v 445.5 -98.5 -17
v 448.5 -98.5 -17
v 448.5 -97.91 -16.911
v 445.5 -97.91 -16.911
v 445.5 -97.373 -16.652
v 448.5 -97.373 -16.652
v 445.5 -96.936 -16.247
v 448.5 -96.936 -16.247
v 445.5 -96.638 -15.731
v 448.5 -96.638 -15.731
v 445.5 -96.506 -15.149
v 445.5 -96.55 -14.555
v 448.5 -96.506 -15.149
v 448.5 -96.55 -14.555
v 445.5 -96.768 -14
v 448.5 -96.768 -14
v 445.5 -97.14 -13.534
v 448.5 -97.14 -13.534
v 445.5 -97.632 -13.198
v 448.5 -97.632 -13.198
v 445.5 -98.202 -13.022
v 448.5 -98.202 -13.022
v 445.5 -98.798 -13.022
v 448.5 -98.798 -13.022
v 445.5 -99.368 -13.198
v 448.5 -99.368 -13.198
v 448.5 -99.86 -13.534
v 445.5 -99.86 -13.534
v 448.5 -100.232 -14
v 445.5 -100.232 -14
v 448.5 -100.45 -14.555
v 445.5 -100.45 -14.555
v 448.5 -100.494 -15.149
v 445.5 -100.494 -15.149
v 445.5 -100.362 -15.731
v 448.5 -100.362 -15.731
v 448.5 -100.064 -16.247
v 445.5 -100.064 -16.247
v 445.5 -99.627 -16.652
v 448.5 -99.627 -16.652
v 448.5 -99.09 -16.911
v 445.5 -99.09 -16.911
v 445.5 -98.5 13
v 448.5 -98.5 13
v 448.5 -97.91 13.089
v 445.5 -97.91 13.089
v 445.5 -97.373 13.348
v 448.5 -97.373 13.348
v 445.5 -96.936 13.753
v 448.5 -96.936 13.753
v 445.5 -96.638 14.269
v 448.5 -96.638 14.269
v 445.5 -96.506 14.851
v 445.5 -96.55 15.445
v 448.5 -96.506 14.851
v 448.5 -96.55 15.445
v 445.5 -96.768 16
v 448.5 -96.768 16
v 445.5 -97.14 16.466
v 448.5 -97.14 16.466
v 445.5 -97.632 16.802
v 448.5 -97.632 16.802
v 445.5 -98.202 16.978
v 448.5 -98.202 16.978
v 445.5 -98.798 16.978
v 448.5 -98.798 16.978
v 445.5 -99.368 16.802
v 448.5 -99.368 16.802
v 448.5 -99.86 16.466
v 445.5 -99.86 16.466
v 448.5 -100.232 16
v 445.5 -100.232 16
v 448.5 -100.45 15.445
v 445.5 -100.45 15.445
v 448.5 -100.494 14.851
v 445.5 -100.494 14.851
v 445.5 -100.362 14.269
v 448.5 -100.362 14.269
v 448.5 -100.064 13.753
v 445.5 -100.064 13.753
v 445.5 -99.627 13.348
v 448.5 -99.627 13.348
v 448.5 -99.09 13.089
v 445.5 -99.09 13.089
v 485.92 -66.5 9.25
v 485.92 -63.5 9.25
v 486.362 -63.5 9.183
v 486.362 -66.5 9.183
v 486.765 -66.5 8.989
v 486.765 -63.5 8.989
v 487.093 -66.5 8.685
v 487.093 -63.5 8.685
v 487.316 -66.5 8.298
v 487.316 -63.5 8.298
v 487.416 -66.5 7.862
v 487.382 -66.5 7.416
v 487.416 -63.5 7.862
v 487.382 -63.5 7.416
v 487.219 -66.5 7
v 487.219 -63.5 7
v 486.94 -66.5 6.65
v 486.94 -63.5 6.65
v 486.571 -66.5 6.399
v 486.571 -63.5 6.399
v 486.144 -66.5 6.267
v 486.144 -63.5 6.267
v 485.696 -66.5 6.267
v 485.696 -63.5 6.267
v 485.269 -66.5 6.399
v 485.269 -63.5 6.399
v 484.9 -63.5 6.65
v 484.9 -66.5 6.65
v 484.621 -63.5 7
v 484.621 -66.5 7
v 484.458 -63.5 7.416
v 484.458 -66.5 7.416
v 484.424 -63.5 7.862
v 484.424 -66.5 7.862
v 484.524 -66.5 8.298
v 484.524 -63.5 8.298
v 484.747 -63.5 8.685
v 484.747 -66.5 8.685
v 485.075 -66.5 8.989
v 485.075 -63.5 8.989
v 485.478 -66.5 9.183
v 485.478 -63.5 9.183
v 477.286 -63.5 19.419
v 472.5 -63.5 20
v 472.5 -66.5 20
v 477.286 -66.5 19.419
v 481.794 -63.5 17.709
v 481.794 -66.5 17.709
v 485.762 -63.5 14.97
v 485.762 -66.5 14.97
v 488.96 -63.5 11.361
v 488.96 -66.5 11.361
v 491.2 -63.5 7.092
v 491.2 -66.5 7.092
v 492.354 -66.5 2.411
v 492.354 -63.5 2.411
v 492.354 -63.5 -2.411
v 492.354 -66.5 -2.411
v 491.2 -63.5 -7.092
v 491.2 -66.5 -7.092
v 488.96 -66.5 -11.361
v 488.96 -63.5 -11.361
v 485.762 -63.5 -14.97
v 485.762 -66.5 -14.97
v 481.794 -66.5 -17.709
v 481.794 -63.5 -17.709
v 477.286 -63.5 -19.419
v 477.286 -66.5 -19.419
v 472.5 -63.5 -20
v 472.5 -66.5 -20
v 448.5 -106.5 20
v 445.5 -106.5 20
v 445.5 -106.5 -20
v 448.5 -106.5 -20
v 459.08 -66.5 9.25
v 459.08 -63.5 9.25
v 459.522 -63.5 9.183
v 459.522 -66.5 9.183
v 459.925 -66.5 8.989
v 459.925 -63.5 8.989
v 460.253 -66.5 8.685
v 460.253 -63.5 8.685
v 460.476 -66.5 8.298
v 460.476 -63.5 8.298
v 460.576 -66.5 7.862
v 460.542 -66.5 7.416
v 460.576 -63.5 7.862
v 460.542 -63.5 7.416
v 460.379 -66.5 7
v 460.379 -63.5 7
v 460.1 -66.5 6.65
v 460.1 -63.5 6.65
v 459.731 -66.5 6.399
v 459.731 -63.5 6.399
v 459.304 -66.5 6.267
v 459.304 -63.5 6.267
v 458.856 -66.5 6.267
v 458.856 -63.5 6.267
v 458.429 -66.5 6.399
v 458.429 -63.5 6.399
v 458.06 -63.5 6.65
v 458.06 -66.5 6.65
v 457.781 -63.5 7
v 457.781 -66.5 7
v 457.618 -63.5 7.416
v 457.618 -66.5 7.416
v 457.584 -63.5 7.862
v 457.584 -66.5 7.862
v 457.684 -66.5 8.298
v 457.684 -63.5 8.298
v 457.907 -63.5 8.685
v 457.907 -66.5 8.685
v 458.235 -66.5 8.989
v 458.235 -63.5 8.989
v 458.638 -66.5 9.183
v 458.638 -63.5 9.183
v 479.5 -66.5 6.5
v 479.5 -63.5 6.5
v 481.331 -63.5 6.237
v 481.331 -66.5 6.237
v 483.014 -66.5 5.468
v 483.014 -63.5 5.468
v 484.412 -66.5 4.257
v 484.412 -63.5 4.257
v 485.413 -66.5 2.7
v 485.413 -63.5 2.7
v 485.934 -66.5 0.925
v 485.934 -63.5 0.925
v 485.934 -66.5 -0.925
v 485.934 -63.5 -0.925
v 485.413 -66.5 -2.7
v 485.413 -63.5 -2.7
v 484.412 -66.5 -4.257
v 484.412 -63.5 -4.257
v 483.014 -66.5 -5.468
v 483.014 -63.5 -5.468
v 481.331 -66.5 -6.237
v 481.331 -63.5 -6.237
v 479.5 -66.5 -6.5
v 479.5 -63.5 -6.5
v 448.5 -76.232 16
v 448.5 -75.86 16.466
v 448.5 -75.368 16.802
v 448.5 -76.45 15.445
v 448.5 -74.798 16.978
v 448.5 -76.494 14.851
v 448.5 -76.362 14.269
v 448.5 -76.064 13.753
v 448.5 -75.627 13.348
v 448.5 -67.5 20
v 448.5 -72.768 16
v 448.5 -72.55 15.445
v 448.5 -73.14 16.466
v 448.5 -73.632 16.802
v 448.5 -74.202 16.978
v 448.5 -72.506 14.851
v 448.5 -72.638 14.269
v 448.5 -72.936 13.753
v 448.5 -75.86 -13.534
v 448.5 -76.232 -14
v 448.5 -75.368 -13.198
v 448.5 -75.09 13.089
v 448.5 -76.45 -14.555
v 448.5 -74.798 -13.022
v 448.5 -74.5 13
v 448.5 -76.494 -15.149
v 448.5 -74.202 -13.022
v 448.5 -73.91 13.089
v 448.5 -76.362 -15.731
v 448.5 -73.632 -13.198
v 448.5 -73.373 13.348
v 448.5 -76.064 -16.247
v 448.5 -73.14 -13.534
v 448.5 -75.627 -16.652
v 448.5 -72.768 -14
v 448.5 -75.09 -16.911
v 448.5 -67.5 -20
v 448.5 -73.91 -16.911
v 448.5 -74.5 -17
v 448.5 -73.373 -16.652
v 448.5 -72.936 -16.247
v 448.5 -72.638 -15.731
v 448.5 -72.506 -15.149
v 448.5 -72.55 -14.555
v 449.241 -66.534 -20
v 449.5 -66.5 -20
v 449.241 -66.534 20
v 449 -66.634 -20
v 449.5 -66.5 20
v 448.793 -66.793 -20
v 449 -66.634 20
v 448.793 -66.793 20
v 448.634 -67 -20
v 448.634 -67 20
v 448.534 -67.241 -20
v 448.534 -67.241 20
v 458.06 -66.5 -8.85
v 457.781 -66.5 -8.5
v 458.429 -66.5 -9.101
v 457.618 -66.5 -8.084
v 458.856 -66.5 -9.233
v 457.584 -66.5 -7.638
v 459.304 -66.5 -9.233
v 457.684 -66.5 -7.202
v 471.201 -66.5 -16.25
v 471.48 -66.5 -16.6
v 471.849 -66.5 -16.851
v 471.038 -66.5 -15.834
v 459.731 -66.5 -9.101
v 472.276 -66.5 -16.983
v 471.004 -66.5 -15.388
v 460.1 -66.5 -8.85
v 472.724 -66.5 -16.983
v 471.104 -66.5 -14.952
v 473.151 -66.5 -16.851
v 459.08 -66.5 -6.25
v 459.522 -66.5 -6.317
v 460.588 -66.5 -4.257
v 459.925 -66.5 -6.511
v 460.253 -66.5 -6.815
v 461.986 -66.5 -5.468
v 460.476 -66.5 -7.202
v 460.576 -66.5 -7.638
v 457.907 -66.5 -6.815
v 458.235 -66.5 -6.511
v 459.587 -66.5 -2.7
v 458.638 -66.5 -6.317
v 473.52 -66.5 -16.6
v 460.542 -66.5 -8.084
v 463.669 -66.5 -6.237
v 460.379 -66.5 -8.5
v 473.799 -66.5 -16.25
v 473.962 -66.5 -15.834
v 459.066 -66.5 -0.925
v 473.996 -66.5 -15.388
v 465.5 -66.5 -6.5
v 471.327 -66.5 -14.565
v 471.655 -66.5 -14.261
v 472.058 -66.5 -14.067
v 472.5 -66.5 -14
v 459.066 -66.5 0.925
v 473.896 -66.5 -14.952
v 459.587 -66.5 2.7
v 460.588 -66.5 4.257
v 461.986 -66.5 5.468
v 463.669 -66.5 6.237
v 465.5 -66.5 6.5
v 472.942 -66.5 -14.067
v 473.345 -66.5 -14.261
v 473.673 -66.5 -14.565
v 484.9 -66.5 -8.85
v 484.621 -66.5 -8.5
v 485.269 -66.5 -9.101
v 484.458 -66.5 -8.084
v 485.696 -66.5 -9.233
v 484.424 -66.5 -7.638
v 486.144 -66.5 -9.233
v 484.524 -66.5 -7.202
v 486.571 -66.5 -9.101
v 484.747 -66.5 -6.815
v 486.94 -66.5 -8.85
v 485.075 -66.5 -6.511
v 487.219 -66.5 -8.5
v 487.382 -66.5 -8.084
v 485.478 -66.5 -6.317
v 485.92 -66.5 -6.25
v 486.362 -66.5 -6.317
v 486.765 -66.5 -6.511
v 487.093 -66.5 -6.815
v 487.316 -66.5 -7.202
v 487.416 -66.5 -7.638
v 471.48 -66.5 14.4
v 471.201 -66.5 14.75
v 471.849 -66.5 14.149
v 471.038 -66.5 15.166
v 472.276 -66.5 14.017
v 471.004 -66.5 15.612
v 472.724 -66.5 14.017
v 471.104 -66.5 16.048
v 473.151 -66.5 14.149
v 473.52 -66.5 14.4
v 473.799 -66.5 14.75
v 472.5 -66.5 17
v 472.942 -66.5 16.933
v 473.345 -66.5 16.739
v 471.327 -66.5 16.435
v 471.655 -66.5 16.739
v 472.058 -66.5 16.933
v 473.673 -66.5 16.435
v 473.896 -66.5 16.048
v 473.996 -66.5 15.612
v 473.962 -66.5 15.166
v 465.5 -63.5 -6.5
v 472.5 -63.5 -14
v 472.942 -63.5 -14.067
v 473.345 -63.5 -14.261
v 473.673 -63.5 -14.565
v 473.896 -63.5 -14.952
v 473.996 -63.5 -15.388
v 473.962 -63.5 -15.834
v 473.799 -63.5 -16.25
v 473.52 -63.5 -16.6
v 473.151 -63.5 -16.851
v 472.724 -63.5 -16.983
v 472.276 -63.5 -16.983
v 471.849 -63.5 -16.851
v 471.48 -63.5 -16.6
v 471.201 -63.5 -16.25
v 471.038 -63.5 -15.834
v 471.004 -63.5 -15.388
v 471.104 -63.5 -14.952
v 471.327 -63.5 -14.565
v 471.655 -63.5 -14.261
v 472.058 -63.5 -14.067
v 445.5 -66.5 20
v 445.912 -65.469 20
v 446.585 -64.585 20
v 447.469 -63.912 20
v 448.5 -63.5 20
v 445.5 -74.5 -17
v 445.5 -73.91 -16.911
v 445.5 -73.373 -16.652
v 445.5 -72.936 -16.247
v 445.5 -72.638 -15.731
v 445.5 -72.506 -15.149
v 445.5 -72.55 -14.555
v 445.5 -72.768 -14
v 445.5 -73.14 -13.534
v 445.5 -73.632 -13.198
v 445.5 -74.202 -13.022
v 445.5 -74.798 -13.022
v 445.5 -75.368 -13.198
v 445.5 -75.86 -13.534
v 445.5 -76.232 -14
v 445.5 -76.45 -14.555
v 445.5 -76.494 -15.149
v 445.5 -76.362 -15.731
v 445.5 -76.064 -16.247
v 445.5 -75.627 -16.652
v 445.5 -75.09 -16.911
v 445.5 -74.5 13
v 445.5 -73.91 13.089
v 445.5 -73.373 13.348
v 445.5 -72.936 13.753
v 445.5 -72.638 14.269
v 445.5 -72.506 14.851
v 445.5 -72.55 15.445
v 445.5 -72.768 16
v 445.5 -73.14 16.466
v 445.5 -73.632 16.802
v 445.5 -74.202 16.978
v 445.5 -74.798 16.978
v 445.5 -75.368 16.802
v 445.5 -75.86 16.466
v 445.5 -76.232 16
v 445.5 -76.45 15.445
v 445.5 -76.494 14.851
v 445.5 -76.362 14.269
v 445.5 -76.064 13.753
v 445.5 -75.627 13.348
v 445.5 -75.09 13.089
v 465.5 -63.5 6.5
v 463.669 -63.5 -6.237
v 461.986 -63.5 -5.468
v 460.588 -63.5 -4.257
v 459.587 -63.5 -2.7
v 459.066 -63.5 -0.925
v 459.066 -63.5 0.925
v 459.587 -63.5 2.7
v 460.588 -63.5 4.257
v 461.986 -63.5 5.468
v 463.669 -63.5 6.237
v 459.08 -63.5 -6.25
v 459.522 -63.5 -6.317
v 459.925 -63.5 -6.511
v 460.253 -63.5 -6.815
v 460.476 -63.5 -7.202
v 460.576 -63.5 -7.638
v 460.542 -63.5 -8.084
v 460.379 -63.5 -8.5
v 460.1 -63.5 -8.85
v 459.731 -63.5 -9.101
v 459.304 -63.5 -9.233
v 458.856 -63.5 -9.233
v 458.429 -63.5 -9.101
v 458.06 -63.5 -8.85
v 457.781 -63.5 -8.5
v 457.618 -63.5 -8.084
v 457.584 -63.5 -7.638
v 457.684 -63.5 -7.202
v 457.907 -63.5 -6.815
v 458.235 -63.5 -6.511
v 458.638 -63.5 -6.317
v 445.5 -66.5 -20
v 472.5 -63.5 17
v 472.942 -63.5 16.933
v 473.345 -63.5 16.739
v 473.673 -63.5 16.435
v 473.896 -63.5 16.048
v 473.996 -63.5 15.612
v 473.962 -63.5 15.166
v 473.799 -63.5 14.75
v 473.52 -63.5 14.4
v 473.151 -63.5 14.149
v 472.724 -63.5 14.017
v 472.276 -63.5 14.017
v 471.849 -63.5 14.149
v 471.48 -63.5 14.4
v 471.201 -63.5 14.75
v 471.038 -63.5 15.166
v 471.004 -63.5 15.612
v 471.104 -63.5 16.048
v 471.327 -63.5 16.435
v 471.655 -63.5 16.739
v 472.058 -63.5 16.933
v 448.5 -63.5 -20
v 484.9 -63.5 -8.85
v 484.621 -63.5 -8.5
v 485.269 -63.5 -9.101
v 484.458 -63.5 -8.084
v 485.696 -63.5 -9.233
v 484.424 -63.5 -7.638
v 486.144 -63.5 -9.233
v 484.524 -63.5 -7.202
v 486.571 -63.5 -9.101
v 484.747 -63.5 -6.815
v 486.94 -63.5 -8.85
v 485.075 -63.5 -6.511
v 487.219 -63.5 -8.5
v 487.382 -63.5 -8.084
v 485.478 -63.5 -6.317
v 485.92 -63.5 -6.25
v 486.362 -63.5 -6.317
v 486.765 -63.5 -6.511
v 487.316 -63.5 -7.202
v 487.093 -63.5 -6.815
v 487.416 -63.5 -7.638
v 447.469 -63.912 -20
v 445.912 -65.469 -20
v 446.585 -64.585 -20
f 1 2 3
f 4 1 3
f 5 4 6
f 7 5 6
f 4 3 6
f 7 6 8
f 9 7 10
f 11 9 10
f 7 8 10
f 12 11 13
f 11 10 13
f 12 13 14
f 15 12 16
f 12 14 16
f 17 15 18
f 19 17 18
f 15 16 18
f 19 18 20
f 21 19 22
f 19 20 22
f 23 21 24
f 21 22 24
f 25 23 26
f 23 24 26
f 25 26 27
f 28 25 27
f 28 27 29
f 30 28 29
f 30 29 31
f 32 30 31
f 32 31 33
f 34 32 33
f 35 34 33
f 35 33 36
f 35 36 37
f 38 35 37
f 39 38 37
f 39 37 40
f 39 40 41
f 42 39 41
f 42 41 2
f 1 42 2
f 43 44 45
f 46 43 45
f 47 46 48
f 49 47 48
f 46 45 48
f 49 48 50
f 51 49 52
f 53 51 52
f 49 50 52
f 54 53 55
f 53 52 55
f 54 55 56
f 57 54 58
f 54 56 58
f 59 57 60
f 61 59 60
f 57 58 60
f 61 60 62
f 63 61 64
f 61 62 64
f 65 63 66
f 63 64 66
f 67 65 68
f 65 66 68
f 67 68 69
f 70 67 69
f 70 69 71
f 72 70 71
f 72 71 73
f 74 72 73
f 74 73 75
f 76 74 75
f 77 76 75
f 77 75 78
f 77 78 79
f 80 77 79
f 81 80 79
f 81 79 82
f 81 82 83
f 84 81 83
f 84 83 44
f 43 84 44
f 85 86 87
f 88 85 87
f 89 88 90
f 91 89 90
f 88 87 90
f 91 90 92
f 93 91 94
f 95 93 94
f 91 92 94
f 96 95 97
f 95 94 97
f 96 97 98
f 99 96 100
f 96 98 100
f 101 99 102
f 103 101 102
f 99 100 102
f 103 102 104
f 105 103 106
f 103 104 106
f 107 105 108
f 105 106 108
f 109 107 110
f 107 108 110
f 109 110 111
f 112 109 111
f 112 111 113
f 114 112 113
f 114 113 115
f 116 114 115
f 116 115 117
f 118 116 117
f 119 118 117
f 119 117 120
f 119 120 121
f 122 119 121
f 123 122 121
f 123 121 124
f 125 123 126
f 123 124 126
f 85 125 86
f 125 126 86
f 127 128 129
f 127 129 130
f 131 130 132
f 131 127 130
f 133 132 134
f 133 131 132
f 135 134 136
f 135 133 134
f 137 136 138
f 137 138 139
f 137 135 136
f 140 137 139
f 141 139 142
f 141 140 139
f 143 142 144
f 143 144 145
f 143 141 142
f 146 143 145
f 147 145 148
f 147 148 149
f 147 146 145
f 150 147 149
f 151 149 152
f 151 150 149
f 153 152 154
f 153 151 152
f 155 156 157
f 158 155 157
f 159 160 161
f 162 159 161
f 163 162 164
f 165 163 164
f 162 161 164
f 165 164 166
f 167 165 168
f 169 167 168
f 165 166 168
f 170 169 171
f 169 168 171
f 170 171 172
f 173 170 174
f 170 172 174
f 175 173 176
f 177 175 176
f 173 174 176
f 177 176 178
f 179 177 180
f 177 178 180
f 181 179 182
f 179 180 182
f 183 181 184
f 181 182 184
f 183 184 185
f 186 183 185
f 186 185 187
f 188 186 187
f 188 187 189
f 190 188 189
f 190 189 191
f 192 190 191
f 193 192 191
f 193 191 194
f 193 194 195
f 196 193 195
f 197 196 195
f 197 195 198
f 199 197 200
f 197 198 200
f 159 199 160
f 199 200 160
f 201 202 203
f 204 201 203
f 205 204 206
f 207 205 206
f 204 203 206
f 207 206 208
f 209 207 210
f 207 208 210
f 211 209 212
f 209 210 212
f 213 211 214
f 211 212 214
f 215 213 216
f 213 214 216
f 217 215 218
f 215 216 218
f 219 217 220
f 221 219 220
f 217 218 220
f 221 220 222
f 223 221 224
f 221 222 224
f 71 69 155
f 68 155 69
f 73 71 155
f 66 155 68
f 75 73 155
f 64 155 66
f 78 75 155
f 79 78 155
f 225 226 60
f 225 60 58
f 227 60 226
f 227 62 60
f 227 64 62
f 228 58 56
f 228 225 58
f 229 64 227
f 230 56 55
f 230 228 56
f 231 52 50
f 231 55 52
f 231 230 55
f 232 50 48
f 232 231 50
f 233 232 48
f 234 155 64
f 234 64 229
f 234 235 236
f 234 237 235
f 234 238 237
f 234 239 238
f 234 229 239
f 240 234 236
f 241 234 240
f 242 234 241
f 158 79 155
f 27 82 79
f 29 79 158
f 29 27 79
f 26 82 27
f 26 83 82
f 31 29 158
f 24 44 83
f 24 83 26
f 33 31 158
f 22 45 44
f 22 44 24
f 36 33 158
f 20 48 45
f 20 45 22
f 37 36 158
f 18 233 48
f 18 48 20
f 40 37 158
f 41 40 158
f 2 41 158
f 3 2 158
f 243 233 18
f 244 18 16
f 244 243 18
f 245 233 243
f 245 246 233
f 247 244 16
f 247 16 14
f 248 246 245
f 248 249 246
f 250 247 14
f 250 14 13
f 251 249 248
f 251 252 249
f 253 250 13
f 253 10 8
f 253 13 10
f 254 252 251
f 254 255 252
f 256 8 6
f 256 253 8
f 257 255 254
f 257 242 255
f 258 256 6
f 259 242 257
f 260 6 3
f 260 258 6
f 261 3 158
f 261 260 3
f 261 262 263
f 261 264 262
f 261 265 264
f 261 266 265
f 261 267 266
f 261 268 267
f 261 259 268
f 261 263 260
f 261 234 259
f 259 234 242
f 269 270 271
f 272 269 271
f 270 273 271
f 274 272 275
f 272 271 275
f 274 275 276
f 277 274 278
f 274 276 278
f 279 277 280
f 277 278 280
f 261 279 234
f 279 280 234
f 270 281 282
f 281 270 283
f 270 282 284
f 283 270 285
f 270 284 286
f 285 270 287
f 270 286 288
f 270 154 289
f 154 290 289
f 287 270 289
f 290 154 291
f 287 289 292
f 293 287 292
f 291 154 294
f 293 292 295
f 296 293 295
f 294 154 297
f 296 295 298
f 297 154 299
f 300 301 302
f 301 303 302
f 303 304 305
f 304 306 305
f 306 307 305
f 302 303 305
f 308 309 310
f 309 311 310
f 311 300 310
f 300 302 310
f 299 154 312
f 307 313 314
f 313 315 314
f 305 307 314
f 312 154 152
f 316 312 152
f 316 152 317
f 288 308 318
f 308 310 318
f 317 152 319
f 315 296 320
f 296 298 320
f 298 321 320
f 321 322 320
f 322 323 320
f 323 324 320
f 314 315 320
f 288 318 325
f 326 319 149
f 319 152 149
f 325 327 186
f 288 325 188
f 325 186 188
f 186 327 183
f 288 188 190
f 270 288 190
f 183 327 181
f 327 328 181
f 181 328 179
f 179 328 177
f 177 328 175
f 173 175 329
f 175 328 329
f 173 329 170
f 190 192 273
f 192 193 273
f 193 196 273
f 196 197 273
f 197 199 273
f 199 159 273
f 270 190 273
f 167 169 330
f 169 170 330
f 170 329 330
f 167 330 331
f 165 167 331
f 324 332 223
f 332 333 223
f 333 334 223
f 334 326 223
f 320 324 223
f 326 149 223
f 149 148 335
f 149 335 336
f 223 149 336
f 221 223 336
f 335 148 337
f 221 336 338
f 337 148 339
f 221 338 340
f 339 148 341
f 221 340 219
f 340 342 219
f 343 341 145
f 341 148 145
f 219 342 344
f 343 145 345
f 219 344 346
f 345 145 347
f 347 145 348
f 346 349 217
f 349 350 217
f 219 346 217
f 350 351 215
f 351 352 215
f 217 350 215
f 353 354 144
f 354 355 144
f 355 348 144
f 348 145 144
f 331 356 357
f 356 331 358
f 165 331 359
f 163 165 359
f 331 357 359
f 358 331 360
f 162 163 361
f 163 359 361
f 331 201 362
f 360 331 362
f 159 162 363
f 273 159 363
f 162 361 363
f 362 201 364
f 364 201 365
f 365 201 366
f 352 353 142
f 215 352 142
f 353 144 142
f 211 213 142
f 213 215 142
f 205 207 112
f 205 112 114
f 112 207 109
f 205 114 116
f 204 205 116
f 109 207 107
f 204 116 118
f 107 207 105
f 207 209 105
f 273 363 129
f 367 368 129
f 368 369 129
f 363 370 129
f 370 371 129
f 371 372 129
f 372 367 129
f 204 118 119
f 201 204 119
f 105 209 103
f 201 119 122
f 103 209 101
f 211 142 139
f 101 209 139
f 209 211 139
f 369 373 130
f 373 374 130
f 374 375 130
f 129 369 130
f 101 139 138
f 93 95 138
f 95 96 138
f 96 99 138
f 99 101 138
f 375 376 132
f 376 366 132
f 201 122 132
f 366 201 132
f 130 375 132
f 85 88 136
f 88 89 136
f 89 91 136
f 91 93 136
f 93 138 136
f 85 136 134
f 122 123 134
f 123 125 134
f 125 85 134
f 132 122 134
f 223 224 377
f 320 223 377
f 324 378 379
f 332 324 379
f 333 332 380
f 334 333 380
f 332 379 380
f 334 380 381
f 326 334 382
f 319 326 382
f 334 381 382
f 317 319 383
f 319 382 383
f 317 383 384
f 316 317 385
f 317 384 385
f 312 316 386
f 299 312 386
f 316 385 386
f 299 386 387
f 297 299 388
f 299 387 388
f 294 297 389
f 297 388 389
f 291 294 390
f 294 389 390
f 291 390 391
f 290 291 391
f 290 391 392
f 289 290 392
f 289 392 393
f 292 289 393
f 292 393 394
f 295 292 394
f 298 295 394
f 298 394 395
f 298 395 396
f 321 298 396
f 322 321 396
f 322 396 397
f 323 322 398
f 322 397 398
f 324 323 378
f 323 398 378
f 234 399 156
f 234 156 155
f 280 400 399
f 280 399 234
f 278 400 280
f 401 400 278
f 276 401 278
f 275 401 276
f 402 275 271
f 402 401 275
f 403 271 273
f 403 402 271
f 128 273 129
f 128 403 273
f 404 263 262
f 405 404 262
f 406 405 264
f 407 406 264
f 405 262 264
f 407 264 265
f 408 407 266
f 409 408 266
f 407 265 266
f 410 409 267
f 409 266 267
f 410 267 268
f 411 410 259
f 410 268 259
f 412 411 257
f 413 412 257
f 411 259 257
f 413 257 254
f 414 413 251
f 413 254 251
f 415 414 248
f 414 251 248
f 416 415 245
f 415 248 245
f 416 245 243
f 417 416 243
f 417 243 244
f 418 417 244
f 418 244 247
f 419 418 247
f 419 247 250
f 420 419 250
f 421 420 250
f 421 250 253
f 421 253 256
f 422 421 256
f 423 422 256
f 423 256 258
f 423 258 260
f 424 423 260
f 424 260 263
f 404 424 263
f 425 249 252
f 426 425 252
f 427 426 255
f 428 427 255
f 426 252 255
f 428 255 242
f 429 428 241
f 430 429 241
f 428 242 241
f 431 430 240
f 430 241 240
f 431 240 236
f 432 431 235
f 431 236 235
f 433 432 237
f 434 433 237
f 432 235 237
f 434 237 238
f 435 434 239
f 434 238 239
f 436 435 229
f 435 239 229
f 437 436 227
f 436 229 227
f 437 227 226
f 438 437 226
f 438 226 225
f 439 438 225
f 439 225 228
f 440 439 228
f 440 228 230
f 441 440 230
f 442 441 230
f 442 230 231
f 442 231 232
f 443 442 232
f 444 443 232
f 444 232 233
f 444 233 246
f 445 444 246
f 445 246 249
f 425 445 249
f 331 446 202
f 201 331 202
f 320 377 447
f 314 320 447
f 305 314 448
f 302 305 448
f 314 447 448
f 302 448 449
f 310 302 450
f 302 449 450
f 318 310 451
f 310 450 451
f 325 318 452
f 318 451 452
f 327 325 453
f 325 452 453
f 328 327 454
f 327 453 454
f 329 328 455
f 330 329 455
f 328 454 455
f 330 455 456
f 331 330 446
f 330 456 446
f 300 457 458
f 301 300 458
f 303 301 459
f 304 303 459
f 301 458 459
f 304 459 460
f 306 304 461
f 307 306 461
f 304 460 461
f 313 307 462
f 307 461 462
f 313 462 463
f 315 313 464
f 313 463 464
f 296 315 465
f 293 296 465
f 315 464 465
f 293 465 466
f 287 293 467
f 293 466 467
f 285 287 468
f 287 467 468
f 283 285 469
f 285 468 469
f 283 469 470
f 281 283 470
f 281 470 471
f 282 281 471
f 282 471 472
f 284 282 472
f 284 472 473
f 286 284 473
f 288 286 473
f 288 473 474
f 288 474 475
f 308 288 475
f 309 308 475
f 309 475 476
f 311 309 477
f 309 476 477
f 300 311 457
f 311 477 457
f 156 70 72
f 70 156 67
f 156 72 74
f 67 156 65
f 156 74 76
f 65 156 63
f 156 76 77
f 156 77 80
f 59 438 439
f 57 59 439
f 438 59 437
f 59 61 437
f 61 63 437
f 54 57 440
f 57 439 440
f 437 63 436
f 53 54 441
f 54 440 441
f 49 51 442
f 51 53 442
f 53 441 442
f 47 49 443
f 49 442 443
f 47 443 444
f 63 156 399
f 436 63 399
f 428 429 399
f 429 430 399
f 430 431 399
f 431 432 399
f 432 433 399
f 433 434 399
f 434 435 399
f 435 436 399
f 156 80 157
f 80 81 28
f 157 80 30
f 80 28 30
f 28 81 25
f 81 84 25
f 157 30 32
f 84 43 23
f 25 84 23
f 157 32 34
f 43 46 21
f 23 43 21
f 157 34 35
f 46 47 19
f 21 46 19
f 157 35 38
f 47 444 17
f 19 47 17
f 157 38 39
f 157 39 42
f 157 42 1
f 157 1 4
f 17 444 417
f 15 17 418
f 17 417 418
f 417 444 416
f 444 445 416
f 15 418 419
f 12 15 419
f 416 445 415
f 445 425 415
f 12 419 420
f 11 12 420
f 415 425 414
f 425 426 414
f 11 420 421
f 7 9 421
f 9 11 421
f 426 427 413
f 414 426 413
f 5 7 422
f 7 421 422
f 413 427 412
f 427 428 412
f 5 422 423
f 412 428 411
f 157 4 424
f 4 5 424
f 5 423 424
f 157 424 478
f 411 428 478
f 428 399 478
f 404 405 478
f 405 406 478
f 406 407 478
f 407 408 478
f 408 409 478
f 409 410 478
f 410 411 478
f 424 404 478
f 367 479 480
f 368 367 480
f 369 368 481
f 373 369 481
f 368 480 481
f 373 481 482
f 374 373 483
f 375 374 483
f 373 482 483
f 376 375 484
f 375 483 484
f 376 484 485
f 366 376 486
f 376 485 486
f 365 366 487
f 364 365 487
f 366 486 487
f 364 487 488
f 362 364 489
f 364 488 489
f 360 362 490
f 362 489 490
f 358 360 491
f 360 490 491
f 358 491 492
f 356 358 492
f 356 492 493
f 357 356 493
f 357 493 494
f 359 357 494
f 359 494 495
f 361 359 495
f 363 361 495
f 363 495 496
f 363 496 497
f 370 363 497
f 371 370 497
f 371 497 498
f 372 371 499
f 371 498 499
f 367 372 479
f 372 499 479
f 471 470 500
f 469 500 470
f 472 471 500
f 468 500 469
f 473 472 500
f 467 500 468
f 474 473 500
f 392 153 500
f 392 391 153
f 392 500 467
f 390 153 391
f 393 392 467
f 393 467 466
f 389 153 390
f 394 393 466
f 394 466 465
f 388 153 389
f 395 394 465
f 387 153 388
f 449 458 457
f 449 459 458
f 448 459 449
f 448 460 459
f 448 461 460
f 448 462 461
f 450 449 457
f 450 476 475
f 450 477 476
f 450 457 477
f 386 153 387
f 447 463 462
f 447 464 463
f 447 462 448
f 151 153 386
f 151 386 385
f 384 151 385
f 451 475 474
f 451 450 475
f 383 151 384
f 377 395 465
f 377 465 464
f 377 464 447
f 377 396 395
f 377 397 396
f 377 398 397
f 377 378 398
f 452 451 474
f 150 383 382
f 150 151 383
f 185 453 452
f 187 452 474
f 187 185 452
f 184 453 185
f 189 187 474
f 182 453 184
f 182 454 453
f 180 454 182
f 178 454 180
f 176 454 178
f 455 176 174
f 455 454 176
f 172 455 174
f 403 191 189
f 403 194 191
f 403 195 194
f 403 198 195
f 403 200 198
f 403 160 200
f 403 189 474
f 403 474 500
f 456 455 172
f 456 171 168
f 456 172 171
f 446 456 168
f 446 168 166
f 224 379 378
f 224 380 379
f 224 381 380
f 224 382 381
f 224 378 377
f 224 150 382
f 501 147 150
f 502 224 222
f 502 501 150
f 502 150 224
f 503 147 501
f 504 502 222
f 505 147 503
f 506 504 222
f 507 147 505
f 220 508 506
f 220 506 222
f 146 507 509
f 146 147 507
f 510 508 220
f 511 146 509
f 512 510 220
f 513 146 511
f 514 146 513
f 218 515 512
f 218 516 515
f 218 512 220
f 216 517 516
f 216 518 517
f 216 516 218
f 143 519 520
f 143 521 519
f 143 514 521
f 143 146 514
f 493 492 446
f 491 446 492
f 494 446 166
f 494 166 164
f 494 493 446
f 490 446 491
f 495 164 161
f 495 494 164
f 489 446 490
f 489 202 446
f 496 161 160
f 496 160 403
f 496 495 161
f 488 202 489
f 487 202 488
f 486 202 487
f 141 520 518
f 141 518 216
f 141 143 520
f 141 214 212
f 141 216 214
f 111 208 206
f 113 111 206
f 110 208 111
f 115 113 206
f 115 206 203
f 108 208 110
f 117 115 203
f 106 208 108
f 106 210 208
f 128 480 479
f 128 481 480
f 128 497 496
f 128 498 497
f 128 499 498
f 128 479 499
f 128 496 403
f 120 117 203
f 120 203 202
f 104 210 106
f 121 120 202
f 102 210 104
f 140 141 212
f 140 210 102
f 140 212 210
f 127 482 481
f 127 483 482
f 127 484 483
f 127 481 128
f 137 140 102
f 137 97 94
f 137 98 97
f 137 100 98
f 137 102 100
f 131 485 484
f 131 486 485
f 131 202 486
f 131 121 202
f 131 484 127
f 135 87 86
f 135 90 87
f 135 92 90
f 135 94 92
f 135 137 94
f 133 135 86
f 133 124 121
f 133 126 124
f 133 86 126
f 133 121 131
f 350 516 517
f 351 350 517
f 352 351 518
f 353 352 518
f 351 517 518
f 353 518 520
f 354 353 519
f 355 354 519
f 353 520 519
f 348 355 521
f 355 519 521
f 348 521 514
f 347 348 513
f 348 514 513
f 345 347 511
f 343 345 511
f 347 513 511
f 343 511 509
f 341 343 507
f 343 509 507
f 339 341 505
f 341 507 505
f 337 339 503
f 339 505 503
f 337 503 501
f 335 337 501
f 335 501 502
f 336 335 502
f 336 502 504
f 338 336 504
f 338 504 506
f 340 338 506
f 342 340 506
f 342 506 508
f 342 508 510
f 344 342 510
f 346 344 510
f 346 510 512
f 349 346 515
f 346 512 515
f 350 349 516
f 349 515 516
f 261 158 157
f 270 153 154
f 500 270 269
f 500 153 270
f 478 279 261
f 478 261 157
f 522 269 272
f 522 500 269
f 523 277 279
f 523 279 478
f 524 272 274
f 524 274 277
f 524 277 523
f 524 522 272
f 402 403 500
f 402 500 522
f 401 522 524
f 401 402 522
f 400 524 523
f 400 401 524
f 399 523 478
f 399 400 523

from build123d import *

# Parameters (mm, degrees)
SKETCH018_W             = 40
SKETCH018_H             = 43
PAD013_DEPTH            = 3
SKETCH019_R             = 1.5
PAD014_DEPTH            = 3
SKETCH020_R             = 2
POCKET003_DEPTH         = 3.001
FILLET_R                = 1
POCKET004_DEPTH         = 40.001
BODY001_PLACEMENT_ANGLE = 90


with BuildPart() as part:
    # Sketch018 → Pad013 (new body)
    with BuildSketch(Plane.XY):
        Rectangle(SKETCH018_W, SKETCH018_H)
    extrude(amount=PAD013_DEPTH)

    # Sketch019 (on Face1 of Pad013) → Pad014 (join)
    with BuildSketch(Plane(origin=(0, 21.5, 0), x_dir=(-1, 0, 0), z_dir=(0, 1, 0))):
        with BuildLine():
            Line((-20, 3), (20, 3))
            Line((20, 3), (20, 27))
            ThreePointArc((20, 27), (0, 47), (-20, 27))
            Line((-20, 27), (-20, 3))
        make_face()
        with Locations((-7.75, 40.42)):
            Circle(SKETCH019_R, mode=Mode.SUBTRACT)
        with Locations((7.75, 40.42)):
            Circle(SKETCH019_R, mode=Mode.SUBTRACT)
        with Locations((15.5, 27)):
            Circle(SKETCH019_R, mode=Mode.SUBTRACT)
        with Locations((-15.5, 27)):
            Circle(SKETCH019_R, mode=Mode.SUBTRACT)
        with Locations((-7.75, 13.58)):
            Circle(SKETCH019_R, mode=Mode.SUBTRACT)
        with Locations((7.75, 13.58)):
            Circle(SKETCH019_R, mode=Mode.SUBTRACT)
        with BuildLine():
            ThreePointArc((6.5, 34), (0, 40.5), (-6.5, 34))
            Line((-6.5, 34), (-6.5, 20))
            ThreePointArc((-6.5, 20), (0, 13.5), (6.5, 20))
            Line((6.5, 20), (6.5, 34))
        make_face(mode=Mode.SUBTRACT)
    extrude(amount=-PAD014_DEPTH)

    # Sketch020 (on Face7 of Pad014) → Pocket003 (cut, through all)
    with BuildSketch(Plane.XY.offset(3)):
        with Locations((15, 10.5)):
            Circle(SKETCH020_R)
        with Locations((15, -13.5)):
            Circle(SKETCH020_R)
        with Locations((-15, 10.5)):
            Circle(SKETCH020_R)
        with Locations((-15, -13.5)):
            Circle(SKETCH020_R)
    extrude(amount=-POCKET003_DEPTH, mode=Mode.SUBTRACT)

    # Fillet
    fillet_edges = [part.edges().sort_by_distance(p)[0] for p in [
        (0, 18.5, 3),
    ]]
    fillet(fillet_edges, radius=FILLET_R)

    # Sketch021 (on Face1 of Fillet) → Pocket004 (cut, through all)
    with BuildSketch(Plane(origin=(-20, 0, 0), x_dir=(0, -1, 0), z_dir=(-1, 0, 0))):
        with BuildLine():
            ThreePointArc((-21.5, 3), (-20.415476, 1.084524), (-18.5, 0))
            Line((-21.5, 0), (-18.5, 0))
            Line((-21.5, 3), (-21.5, 0))
        make_face()
    extrude(amount=-POCKET004_DEPTH, mode=Mode.SUBTRACT)


with BuildPart() as part_1:
    # Body001 placement: moved
    add(part.part.moved(Location((445.5, -85, 0))).rotate(Axis((445.5, -85, 0), (0, 1, 0)), BODY001_PLACEMENT_ANGLE))


solid = part_1.part
